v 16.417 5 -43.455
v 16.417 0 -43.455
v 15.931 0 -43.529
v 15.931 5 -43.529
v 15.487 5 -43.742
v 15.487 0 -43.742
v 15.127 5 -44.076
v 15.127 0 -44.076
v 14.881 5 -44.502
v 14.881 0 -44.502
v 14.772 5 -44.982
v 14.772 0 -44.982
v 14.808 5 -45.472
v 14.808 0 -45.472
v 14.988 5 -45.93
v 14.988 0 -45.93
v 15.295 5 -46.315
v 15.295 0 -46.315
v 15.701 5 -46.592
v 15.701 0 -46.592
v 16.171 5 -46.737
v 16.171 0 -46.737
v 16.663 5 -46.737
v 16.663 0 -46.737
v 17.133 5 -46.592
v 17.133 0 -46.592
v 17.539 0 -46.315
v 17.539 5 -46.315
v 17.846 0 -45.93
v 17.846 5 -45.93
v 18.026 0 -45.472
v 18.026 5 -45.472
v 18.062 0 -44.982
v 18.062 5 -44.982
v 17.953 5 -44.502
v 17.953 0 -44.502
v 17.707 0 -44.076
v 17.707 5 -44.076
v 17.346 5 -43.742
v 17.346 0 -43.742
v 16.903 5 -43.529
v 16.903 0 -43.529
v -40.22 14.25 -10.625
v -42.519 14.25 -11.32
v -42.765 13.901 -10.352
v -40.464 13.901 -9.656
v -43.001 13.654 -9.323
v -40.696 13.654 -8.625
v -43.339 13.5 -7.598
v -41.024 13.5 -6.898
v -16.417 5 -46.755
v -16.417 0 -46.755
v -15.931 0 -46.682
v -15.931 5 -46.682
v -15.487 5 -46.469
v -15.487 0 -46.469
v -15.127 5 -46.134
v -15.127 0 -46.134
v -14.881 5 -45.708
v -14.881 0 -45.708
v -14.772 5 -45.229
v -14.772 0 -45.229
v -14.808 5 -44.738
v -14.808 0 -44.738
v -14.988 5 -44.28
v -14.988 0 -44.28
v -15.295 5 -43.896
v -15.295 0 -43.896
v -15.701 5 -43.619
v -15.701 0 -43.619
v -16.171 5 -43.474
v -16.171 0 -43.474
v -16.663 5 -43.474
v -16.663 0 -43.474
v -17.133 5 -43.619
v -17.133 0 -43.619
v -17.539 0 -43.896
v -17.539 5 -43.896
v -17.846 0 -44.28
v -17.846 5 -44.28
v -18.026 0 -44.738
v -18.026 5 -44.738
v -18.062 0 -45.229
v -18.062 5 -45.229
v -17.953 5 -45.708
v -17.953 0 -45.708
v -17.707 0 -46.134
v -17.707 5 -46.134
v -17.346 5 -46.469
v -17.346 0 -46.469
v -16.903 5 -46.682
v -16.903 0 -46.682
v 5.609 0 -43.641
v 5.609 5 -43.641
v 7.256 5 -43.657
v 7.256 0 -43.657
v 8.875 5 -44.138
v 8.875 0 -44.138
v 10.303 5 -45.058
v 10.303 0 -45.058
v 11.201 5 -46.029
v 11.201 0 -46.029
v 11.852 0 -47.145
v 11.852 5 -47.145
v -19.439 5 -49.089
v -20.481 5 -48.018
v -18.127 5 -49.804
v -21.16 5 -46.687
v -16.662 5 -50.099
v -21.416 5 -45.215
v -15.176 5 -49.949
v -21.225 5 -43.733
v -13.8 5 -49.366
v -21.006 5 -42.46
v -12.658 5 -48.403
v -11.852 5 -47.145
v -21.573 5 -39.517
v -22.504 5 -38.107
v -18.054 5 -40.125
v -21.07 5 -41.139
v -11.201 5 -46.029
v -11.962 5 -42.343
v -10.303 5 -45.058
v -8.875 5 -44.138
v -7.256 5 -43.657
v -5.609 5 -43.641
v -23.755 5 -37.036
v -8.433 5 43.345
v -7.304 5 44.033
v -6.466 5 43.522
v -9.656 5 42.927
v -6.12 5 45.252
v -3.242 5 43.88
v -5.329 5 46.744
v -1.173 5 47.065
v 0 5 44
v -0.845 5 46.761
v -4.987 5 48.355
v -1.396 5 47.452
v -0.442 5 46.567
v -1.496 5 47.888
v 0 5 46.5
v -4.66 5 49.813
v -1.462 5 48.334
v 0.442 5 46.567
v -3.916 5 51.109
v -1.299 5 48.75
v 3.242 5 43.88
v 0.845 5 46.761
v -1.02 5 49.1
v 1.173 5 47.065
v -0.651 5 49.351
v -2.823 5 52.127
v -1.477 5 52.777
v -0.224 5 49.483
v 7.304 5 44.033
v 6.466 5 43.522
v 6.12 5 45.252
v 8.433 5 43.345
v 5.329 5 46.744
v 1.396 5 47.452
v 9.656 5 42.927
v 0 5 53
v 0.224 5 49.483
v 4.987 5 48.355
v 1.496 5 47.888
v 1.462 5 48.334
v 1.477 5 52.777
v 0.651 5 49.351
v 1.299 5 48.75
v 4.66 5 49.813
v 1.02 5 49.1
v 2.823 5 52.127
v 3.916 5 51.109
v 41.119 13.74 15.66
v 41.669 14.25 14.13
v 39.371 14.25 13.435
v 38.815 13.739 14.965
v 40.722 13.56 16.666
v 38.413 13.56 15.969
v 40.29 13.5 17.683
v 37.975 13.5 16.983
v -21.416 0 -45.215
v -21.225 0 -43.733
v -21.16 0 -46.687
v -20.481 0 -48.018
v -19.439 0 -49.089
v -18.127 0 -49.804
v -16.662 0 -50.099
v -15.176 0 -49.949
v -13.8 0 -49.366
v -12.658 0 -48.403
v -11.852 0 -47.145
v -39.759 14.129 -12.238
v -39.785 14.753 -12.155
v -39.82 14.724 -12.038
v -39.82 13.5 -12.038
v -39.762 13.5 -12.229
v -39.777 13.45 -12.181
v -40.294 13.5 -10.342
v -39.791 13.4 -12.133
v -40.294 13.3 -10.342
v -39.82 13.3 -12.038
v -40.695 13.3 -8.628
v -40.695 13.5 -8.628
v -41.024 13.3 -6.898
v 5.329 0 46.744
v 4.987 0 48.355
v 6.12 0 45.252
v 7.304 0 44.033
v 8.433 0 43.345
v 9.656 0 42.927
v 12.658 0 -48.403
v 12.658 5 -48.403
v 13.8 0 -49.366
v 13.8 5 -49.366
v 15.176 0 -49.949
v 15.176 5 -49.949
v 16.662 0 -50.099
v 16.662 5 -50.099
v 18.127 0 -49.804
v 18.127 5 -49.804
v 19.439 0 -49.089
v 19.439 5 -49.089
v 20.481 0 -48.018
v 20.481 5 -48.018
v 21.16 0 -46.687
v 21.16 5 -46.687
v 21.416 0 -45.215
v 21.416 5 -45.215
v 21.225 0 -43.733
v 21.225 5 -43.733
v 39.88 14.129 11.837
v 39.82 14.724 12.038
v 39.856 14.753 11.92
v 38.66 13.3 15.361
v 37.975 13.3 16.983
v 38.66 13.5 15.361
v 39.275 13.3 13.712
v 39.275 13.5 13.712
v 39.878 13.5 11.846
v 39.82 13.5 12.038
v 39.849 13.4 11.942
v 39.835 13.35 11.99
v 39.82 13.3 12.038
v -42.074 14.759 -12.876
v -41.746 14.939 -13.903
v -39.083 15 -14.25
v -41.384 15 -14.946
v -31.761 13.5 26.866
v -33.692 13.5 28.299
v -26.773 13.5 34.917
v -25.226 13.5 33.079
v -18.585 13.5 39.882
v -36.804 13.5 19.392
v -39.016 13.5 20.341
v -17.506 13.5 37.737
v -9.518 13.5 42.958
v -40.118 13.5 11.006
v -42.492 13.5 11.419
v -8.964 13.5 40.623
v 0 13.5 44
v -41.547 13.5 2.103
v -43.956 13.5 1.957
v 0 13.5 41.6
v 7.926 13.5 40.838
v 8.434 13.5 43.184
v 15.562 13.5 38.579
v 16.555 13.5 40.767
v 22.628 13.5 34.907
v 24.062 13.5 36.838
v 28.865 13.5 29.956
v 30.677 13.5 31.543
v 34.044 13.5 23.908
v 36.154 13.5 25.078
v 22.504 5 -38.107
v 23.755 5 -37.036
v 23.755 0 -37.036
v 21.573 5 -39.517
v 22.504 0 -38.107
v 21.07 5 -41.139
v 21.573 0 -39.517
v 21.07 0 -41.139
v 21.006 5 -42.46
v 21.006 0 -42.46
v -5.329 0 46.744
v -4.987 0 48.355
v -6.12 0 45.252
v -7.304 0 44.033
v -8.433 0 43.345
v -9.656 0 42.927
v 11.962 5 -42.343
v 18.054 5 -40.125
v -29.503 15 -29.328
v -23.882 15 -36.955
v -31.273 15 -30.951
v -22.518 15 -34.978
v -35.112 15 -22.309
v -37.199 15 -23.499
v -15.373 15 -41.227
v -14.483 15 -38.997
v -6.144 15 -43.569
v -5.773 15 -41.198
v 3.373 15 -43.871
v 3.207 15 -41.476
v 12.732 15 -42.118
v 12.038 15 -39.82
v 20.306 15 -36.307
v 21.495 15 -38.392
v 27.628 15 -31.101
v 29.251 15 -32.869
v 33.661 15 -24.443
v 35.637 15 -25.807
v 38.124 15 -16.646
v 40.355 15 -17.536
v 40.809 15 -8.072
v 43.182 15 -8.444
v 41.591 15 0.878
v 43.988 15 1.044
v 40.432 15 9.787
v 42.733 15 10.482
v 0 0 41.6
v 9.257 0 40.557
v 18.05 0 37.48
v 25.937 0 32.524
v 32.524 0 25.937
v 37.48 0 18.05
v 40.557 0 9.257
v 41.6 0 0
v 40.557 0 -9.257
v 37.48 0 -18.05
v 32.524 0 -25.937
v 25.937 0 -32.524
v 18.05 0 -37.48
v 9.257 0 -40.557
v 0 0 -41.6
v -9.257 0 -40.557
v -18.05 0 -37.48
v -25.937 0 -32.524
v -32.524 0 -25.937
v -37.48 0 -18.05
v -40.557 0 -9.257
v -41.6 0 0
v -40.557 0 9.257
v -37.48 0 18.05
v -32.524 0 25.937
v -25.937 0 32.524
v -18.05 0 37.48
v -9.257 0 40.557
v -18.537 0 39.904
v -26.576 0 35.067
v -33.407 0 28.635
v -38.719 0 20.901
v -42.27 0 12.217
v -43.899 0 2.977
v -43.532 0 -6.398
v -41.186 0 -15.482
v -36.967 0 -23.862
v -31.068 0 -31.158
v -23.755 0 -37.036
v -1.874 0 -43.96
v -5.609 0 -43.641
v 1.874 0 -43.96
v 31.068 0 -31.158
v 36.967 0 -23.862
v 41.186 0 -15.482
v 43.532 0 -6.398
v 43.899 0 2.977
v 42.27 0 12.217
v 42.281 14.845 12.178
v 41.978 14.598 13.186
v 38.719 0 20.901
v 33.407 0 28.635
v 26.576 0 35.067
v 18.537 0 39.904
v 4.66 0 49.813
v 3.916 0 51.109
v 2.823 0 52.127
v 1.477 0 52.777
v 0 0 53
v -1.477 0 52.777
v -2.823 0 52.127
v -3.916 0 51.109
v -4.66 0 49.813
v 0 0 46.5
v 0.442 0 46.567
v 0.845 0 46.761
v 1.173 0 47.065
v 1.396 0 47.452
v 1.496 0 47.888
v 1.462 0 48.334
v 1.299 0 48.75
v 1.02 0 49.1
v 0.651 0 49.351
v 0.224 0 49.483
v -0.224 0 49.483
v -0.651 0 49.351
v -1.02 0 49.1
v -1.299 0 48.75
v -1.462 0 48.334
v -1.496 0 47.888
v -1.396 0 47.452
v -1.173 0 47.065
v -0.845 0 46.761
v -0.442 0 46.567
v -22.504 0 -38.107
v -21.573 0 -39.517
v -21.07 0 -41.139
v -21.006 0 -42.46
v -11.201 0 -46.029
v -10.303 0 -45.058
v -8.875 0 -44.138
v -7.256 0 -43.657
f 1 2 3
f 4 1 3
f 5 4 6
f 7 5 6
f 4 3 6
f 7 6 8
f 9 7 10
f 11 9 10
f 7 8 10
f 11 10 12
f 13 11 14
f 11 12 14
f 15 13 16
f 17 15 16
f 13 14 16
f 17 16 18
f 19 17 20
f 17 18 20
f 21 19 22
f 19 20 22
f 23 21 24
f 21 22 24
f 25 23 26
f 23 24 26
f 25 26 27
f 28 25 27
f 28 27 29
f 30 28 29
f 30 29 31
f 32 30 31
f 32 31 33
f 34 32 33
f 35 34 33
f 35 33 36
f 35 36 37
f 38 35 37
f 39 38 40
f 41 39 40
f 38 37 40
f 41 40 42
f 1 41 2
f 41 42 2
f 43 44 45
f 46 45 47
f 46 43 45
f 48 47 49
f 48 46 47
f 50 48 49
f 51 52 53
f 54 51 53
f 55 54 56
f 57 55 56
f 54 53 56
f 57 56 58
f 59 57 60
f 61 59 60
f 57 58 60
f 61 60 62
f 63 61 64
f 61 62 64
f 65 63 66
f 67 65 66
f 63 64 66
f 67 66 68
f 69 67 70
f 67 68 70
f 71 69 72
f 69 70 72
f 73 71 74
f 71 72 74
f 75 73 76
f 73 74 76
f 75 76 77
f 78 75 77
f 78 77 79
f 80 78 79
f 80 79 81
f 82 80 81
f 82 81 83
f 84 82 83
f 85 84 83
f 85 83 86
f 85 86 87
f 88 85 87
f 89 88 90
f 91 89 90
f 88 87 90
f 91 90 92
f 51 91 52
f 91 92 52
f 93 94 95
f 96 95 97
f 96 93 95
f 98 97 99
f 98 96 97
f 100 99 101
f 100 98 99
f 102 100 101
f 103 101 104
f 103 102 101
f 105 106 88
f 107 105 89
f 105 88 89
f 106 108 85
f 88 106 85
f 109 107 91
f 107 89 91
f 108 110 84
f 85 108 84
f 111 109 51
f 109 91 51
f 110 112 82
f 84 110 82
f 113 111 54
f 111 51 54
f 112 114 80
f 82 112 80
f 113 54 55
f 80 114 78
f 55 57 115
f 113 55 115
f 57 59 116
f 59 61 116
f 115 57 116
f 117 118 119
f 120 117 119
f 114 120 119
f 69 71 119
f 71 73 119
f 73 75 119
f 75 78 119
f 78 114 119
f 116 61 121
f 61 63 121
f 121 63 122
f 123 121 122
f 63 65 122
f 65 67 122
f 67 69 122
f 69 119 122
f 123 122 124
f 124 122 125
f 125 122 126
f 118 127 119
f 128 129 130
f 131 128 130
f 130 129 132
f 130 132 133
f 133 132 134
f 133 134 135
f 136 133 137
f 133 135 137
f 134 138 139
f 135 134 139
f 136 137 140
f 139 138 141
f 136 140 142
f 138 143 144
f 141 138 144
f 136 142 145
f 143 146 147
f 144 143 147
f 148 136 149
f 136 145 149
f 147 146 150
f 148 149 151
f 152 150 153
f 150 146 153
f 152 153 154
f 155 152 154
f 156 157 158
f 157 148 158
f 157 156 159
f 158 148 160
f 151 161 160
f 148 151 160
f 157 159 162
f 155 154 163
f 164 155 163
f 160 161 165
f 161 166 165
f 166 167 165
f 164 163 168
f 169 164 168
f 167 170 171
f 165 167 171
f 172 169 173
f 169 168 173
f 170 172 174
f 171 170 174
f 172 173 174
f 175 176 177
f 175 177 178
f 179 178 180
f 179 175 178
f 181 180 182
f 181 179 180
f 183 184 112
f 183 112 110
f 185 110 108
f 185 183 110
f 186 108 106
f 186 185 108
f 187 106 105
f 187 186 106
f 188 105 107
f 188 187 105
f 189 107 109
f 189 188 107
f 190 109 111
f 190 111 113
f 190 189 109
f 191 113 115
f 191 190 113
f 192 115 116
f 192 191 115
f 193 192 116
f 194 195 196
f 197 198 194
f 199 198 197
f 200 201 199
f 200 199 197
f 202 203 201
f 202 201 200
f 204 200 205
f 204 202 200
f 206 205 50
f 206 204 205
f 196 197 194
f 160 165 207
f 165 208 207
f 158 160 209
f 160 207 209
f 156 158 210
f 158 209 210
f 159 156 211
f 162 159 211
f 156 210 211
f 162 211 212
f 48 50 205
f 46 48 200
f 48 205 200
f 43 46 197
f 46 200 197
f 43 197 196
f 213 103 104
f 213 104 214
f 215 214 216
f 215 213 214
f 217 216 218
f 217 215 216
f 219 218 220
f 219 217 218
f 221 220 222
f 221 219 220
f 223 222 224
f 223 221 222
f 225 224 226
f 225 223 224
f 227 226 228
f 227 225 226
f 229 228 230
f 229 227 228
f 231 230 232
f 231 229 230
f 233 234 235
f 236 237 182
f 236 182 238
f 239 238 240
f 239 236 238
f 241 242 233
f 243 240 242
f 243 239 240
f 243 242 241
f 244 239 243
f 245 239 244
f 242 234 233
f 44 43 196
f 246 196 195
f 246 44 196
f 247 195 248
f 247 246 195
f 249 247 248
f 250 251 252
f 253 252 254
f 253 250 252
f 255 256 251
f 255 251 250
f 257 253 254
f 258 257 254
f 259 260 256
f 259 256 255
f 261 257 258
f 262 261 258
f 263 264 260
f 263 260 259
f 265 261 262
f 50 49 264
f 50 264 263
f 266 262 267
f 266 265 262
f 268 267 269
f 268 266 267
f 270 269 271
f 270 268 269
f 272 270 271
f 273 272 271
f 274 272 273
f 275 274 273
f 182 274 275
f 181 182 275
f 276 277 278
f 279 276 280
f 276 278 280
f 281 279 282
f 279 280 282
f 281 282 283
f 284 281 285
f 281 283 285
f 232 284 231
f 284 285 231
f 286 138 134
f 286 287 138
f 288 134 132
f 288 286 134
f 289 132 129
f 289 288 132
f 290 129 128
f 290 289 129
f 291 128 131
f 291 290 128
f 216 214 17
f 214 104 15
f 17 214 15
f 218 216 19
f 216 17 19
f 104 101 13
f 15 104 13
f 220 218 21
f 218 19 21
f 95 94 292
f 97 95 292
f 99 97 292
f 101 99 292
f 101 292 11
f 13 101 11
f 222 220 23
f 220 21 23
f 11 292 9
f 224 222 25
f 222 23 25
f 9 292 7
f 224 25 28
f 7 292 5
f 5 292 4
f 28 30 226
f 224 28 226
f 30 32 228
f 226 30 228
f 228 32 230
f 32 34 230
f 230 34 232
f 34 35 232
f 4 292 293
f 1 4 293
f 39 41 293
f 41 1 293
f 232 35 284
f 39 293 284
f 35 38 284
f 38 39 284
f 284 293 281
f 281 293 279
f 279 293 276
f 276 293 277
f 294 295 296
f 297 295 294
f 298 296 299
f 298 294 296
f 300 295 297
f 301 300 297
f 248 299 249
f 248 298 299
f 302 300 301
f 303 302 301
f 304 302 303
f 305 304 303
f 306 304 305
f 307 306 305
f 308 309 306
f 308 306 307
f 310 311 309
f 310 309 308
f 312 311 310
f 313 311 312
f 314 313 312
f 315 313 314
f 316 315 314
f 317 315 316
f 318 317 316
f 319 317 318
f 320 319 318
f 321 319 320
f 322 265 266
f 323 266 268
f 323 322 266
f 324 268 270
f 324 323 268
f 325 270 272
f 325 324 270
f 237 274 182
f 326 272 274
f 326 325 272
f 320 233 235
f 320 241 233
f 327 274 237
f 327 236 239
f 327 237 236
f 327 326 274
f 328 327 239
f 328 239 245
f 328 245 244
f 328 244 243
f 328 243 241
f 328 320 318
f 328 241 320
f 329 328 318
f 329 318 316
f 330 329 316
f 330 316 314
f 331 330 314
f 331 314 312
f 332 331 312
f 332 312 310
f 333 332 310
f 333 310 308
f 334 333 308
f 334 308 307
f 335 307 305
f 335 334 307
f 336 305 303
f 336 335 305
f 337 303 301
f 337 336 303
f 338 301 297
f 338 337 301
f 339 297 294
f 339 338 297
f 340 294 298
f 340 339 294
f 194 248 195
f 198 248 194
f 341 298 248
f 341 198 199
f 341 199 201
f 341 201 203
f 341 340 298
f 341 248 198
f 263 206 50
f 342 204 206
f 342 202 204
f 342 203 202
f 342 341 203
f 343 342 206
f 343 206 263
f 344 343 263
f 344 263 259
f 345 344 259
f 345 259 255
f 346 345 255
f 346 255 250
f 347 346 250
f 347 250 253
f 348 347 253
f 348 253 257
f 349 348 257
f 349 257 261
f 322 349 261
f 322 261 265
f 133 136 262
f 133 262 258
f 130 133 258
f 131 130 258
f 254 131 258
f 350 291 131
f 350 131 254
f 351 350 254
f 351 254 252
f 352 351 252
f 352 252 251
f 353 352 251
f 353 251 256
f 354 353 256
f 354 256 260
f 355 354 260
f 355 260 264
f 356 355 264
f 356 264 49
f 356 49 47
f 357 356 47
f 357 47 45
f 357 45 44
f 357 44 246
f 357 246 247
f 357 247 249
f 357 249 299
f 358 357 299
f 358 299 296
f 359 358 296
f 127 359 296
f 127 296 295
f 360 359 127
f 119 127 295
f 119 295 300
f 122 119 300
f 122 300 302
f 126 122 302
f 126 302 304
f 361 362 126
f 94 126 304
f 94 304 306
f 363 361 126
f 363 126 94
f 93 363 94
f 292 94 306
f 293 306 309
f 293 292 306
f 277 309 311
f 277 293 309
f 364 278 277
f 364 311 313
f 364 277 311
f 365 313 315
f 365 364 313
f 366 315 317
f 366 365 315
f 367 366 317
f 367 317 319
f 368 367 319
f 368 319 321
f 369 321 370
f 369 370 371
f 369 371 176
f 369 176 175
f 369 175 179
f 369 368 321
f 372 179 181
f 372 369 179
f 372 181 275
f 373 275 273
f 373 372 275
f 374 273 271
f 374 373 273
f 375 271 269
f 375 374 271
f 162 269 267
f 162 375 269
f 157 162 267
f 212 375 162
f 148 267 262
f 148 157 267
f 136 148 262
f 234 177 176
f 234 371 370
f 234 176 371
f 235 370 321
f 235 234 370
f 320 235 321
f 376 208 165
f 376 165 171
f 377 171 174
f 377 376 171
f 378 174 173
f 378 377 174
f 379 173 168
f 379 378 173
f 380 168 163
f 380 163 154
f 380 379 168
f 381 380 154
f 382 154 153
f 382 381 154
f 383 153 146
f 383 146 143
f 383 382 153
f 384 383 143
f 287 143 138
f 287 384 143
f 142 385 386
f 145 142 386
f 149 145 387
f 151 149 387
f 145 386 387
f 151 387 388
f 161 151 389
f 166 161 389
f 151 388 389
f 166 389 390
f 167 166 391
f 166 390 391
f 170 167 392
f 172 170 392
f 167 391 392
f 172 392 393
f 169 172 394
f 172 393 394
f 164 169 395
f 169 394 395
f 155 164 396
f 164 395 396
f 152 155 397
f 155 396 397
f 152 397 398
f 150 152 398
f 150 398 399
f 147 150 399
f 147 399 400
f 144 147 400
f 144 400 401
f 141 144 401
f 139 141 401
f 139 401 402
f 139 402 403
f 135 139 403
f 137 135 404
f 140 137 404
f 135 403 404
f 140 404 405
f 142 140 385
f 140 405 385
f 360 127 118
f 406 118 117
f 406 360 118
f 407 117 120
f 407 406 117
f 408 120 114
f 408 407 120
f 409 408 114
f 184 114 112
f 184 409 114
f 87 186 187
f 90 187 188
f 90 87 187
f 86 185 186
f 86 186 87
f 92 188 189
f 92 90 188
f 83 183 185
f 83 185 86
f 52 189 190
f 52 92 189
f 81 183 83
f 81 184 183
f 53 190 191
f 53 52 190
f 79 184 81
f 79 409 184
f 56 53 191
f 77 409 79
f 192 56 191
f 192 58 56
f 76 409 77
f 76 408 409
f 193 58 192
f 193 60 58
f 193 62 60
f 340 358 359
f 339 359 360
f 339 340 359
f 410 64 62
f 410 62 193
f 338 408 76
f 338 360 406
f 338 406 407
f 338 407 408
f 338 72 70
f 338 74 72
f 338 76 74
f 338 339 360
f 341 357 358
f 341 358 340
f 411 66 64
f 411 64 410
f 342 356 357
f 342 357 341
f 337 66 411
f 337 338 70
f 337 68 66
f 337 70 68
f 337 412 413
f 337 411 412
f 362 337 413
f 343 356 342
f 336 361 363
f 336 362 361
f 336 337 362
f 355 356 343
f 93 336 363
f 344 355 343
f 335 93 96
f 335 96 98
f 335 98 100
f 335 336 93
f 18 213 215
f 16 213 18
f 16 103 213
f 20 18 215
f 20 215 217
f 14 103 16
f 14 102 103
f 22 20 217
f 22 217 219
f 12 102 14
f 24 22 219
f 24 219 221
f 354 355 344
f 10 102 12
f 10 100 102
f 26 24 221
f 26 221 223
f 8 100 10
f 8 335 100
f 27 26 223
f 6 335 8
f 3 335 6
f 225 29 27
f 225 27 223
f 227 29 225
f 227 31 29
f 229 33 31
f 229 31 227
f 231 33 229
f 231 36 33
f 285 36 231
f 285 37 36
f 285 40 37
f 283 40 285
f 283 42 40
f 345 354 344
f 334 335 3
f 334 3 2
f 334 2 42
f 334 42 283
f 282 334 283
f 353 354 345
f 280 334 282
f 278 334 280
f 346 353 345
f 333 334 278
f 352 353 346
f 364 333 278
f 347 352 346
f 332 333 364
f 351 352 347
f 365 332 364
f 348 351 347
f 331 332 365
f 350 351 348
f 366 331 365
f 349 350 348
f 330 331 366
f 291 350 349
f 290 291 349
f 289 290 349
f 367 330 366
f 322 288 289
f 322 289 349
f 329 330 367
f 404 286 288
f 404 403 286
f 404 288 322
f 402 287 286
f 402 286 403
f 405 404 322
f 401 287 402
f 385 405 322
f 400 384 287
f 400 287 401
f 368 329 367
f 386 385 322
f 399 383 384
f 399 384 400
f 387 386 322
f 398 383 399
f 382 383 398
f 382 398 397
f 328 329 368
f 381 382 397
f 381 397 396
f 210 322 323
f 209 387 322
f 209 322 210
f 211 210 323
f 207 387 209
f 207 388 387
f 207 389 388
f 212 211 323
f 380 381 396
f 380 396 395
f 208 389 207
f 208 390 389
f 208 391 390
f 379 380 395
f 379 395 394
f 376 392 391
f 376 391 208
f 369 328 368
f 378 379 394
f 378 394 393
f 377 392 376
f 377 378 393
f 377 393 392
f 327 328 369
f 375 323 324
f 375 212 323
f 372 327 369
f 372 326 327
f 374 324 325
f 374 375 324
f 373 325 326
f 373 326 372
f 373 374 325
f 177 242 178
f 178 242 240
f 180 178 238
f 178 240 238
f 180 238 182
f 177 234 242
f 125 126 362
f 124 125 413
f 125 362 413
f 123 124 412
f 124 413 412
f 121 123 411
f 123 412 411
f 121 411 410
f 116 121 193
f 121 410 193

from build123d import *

# Parameters (mm, degrees)
SKETCH_1_R          = 44
SKETCH_1_R_2        = 41.6
EXTRUDE_1_DEPTH     = 15
SKETCH_2_R          = 5
SKETCH_2_R_2        = 1.5
SKETCH_2_R_3        = 1.65
EXTRUDE_2_DEPTH     = 5
FILLET_1_R          = 6
CUT_EXTRUDE_START   = -1.5
CUT_EXTRUDE_1_DEPTH = 1.5
FILLET_2_R          = 10
FILLET_START        = -45
FILLET_3_DEPTH      = 90


with BuildPart() as part:
    # 草图1 → 凸台-拉伸1 (new body)
    with BuildSketch(Plane(origin=(0, 0, 0), x_dir=(1, 0, 0), z_dir=(0, 1, 0))):
        with Locations(Location((0, 0, 0), (0, 0, 270))):
            Circle(SKETCH_1_R)
        with Locations(Location((0, 0, 0), (0, 0, 270))):
            Circle(SKETCH_1_R_2, mode=Mode.SUBTRACT)
    extrude(amount=EXTRUDE_1_DEPTH)

    # 草图2 → 凸台-拉伸2 (add)
    # profile 1 of 3: a face of its own
    with BuildSketch(Plane.XZ):
        with Locations((0, 48)):
            Circle(SKETCH_2_R)
        with Locations(Location((0, 48, 0), (0, 0, 270))):
            Circle(SKETCH_2_R_2, mode=Mode.SUBTRACT)
    # profile 2 of 3: a face of its own
    with BuildSketch(Plane.XZ):
        with Locations((-16.41696688, -45.105245798)):
            Circle(SKETCH_2_R)
        with Locations(Location((-16.41696688, -45.105245798, 0), (0, 0, 270))):
            Circle(SKETCH_2_R_3, mode=Mode.SUBTRACT)
    # profile 3 of 3: a face of its own
    with BuildSketch(Plane.XZ):
        with Locations((16.41696688, -45.105245798)):
            Circle(SKETCH_2_R)
        with Locations(Location((16.41696688, -45.105245798, 0), (0, 0, 90))):
            Circle(SKETCH_2_R_3, mode=Mode.SUBTRACT)
    extrude(amount=-EXTRUDE_2_DEPTH)

    # 圆角1
    fillet_1_edges = [part.edges().sort_by_distance(p)[0] for p in [
        (2.870750936, 2.5, 43.90625),
        (-2.870750936, 2.5, 43.90625),
        (-17.714445389, 2.5, -40.276524485),
        (-12.319198447, 2.5, -42.240233778),
        (12.319198447, 2.5, -42.240233778),
        (17.714445389, 2.5, -40.276524485),
    ]]
    fillet(fillet_1_edges, radius=FILLET_1_R)

    # 草图3 → 切除-拉伸1 (cut)
    with BuildSketch(Plane(origin=(0, 15, 0), x_dir=(1, 0, 0), z_dir=(0, 1, 0)).offset(CUT_EXTRUDE_START)):
        with BuildLine():
            Line((42.117616116, -12.732101662), (39.8202916, -12.03762339))
            ThreePointArc((39.8202916, -12.03762339), (-12.03762339, -39.8202916), (-39.8202916, 12.03762339))
            Line((-39.8202916, 12.03762339), (-42.117616116, 12.732101662))
            ThreePointArc((-42.117616116, 12.732101662), (-12.732101662, -42.117616116), (42.117616116, -12.732101662))
        make_face()
    extrude(amount=CUT_EXTRUDE_1_DEPTH, mode=Mode.SUBTRACT)

    # 圆角2
    # the kernel refuses this fillet: 10 mm, written as the material it adds along each edge
    with BuildSketch(Plane(origin=(-27.214137615, 13.5, -8.22679911), x_dir=(-0.28936594687336814, 0, 0.9572185480808858), z_dir=(-0.9572185480808859, 0, -0.28936594687336814))) as fillet_2_piece_1_section:
        with BuildLine():
            CenterArc((5.267826876, 10), FILLET_2_R, 238.211669383, 31.788330617)
            Line((0, 1.5), (-0.105356538, 1.33))
            ThreePointArc((-0.105356538, 1.33), (-0.2, 0.75), (-0.2, 0))
            Line((-0.2, 0), (0, -0.2))
            Line((0, -0.2), (5.267826876, -0.2))
            Line((5.267826876, -0.2), (5.267826876, 0))
        make_face()
    fillet_2_piece_1 = extrude(amount=28.739134382, mode=Mode.PRIVATE)
    fillet_2_piece_1 = fillet_2_piece_1 & Plane(origin=(0, 13.5, 0), x_dir=(0, 0, 1), z_dir=(0, -1, 0)) * Cylinder(44, 79, mode=Mode.PRIVATE)
    fillet_2_piece_1 = fillet_2_piece_1 - Plane(origin=(0, 13.5, 0), x_dir=(0, 0, 1), z_dir=(0, -1, 0)) * Cylinder(41.6, 79, mode=Mode.PRIVATE)
    add(fillet_2_piece_1)
    with BuildSketch(Plane(origin=(54.723770101, 13.5, 16.542925943), x_dir=(-0.2893659468733635, 0, 0.9572185480808872), z_dir=(-0.9572185480808872, 0, -0.2893659468733635))) as fillet_2_piece_2_section:
        with BuildLine():
            CenterArc((5.267826876, 10), FILLET_2_R, 238.211669383, 31.788330617)
            Line((0, 1.5), (-0.105356538, 1.33))
            ThreePointArc((-0.105356538, 1.33), (-0.2, 0.75), (-0.2, 0))
            Line((-0.2, 0), (0, -0.2))
            Line((0, -0.2), (5.267826876, -0.2))
            Line((5.267826876, -0.2), (5.267826876, 0))
        make_face()
    fillet_2_piece_2 = extrude(amount=28.739134382, mode=Mode.PRIVATE)
    fillet_2_piece_2 = fillet_2_piece_2 & Plane(origin=(0, 13.5, 0), x_dir=(0, 0, 1), z_dir=(0, -1, 0)) * Cylinder(44, 79, mode=Mode.PRIVATE)
    fillet_2_piece_2 = fillet_2_piece_2 - Plane(origin=(0, 13.5, 0), x_dir=(0, 0, 1), z_dir=(0, -1, 0)) * Cylinder(41.6, 79, mode=Mode.PRIVATE)
    add(fillet_2_piece_2)

    # 圆角3: read off the stored shape, not the designer's step
    # 圆角3 outline → 圆角3 (cut)
    with BuildSketch(Plane(origin=(0, 0, 0), x_dir=(0, 1, 0), z_dir=(0.9572185480808874, 0, 0.2893659468733631)).offset(FILLET_START)):
        with BuildLine():
            ThreePointArc((14.25, 1.468155838), (14.810708435, -0.395023527), (15, -2.3315152))
            Line((15, -2.3315152), (15, 0))
            ThreePointArc((15, 0), (14.594692852, 0.718595666), (14.25, 1.468155838))
        make_face()
    extrude(amount=FILLET_3_DEPTH, mode=Mode.SUBTRACT)


solid = part.part
